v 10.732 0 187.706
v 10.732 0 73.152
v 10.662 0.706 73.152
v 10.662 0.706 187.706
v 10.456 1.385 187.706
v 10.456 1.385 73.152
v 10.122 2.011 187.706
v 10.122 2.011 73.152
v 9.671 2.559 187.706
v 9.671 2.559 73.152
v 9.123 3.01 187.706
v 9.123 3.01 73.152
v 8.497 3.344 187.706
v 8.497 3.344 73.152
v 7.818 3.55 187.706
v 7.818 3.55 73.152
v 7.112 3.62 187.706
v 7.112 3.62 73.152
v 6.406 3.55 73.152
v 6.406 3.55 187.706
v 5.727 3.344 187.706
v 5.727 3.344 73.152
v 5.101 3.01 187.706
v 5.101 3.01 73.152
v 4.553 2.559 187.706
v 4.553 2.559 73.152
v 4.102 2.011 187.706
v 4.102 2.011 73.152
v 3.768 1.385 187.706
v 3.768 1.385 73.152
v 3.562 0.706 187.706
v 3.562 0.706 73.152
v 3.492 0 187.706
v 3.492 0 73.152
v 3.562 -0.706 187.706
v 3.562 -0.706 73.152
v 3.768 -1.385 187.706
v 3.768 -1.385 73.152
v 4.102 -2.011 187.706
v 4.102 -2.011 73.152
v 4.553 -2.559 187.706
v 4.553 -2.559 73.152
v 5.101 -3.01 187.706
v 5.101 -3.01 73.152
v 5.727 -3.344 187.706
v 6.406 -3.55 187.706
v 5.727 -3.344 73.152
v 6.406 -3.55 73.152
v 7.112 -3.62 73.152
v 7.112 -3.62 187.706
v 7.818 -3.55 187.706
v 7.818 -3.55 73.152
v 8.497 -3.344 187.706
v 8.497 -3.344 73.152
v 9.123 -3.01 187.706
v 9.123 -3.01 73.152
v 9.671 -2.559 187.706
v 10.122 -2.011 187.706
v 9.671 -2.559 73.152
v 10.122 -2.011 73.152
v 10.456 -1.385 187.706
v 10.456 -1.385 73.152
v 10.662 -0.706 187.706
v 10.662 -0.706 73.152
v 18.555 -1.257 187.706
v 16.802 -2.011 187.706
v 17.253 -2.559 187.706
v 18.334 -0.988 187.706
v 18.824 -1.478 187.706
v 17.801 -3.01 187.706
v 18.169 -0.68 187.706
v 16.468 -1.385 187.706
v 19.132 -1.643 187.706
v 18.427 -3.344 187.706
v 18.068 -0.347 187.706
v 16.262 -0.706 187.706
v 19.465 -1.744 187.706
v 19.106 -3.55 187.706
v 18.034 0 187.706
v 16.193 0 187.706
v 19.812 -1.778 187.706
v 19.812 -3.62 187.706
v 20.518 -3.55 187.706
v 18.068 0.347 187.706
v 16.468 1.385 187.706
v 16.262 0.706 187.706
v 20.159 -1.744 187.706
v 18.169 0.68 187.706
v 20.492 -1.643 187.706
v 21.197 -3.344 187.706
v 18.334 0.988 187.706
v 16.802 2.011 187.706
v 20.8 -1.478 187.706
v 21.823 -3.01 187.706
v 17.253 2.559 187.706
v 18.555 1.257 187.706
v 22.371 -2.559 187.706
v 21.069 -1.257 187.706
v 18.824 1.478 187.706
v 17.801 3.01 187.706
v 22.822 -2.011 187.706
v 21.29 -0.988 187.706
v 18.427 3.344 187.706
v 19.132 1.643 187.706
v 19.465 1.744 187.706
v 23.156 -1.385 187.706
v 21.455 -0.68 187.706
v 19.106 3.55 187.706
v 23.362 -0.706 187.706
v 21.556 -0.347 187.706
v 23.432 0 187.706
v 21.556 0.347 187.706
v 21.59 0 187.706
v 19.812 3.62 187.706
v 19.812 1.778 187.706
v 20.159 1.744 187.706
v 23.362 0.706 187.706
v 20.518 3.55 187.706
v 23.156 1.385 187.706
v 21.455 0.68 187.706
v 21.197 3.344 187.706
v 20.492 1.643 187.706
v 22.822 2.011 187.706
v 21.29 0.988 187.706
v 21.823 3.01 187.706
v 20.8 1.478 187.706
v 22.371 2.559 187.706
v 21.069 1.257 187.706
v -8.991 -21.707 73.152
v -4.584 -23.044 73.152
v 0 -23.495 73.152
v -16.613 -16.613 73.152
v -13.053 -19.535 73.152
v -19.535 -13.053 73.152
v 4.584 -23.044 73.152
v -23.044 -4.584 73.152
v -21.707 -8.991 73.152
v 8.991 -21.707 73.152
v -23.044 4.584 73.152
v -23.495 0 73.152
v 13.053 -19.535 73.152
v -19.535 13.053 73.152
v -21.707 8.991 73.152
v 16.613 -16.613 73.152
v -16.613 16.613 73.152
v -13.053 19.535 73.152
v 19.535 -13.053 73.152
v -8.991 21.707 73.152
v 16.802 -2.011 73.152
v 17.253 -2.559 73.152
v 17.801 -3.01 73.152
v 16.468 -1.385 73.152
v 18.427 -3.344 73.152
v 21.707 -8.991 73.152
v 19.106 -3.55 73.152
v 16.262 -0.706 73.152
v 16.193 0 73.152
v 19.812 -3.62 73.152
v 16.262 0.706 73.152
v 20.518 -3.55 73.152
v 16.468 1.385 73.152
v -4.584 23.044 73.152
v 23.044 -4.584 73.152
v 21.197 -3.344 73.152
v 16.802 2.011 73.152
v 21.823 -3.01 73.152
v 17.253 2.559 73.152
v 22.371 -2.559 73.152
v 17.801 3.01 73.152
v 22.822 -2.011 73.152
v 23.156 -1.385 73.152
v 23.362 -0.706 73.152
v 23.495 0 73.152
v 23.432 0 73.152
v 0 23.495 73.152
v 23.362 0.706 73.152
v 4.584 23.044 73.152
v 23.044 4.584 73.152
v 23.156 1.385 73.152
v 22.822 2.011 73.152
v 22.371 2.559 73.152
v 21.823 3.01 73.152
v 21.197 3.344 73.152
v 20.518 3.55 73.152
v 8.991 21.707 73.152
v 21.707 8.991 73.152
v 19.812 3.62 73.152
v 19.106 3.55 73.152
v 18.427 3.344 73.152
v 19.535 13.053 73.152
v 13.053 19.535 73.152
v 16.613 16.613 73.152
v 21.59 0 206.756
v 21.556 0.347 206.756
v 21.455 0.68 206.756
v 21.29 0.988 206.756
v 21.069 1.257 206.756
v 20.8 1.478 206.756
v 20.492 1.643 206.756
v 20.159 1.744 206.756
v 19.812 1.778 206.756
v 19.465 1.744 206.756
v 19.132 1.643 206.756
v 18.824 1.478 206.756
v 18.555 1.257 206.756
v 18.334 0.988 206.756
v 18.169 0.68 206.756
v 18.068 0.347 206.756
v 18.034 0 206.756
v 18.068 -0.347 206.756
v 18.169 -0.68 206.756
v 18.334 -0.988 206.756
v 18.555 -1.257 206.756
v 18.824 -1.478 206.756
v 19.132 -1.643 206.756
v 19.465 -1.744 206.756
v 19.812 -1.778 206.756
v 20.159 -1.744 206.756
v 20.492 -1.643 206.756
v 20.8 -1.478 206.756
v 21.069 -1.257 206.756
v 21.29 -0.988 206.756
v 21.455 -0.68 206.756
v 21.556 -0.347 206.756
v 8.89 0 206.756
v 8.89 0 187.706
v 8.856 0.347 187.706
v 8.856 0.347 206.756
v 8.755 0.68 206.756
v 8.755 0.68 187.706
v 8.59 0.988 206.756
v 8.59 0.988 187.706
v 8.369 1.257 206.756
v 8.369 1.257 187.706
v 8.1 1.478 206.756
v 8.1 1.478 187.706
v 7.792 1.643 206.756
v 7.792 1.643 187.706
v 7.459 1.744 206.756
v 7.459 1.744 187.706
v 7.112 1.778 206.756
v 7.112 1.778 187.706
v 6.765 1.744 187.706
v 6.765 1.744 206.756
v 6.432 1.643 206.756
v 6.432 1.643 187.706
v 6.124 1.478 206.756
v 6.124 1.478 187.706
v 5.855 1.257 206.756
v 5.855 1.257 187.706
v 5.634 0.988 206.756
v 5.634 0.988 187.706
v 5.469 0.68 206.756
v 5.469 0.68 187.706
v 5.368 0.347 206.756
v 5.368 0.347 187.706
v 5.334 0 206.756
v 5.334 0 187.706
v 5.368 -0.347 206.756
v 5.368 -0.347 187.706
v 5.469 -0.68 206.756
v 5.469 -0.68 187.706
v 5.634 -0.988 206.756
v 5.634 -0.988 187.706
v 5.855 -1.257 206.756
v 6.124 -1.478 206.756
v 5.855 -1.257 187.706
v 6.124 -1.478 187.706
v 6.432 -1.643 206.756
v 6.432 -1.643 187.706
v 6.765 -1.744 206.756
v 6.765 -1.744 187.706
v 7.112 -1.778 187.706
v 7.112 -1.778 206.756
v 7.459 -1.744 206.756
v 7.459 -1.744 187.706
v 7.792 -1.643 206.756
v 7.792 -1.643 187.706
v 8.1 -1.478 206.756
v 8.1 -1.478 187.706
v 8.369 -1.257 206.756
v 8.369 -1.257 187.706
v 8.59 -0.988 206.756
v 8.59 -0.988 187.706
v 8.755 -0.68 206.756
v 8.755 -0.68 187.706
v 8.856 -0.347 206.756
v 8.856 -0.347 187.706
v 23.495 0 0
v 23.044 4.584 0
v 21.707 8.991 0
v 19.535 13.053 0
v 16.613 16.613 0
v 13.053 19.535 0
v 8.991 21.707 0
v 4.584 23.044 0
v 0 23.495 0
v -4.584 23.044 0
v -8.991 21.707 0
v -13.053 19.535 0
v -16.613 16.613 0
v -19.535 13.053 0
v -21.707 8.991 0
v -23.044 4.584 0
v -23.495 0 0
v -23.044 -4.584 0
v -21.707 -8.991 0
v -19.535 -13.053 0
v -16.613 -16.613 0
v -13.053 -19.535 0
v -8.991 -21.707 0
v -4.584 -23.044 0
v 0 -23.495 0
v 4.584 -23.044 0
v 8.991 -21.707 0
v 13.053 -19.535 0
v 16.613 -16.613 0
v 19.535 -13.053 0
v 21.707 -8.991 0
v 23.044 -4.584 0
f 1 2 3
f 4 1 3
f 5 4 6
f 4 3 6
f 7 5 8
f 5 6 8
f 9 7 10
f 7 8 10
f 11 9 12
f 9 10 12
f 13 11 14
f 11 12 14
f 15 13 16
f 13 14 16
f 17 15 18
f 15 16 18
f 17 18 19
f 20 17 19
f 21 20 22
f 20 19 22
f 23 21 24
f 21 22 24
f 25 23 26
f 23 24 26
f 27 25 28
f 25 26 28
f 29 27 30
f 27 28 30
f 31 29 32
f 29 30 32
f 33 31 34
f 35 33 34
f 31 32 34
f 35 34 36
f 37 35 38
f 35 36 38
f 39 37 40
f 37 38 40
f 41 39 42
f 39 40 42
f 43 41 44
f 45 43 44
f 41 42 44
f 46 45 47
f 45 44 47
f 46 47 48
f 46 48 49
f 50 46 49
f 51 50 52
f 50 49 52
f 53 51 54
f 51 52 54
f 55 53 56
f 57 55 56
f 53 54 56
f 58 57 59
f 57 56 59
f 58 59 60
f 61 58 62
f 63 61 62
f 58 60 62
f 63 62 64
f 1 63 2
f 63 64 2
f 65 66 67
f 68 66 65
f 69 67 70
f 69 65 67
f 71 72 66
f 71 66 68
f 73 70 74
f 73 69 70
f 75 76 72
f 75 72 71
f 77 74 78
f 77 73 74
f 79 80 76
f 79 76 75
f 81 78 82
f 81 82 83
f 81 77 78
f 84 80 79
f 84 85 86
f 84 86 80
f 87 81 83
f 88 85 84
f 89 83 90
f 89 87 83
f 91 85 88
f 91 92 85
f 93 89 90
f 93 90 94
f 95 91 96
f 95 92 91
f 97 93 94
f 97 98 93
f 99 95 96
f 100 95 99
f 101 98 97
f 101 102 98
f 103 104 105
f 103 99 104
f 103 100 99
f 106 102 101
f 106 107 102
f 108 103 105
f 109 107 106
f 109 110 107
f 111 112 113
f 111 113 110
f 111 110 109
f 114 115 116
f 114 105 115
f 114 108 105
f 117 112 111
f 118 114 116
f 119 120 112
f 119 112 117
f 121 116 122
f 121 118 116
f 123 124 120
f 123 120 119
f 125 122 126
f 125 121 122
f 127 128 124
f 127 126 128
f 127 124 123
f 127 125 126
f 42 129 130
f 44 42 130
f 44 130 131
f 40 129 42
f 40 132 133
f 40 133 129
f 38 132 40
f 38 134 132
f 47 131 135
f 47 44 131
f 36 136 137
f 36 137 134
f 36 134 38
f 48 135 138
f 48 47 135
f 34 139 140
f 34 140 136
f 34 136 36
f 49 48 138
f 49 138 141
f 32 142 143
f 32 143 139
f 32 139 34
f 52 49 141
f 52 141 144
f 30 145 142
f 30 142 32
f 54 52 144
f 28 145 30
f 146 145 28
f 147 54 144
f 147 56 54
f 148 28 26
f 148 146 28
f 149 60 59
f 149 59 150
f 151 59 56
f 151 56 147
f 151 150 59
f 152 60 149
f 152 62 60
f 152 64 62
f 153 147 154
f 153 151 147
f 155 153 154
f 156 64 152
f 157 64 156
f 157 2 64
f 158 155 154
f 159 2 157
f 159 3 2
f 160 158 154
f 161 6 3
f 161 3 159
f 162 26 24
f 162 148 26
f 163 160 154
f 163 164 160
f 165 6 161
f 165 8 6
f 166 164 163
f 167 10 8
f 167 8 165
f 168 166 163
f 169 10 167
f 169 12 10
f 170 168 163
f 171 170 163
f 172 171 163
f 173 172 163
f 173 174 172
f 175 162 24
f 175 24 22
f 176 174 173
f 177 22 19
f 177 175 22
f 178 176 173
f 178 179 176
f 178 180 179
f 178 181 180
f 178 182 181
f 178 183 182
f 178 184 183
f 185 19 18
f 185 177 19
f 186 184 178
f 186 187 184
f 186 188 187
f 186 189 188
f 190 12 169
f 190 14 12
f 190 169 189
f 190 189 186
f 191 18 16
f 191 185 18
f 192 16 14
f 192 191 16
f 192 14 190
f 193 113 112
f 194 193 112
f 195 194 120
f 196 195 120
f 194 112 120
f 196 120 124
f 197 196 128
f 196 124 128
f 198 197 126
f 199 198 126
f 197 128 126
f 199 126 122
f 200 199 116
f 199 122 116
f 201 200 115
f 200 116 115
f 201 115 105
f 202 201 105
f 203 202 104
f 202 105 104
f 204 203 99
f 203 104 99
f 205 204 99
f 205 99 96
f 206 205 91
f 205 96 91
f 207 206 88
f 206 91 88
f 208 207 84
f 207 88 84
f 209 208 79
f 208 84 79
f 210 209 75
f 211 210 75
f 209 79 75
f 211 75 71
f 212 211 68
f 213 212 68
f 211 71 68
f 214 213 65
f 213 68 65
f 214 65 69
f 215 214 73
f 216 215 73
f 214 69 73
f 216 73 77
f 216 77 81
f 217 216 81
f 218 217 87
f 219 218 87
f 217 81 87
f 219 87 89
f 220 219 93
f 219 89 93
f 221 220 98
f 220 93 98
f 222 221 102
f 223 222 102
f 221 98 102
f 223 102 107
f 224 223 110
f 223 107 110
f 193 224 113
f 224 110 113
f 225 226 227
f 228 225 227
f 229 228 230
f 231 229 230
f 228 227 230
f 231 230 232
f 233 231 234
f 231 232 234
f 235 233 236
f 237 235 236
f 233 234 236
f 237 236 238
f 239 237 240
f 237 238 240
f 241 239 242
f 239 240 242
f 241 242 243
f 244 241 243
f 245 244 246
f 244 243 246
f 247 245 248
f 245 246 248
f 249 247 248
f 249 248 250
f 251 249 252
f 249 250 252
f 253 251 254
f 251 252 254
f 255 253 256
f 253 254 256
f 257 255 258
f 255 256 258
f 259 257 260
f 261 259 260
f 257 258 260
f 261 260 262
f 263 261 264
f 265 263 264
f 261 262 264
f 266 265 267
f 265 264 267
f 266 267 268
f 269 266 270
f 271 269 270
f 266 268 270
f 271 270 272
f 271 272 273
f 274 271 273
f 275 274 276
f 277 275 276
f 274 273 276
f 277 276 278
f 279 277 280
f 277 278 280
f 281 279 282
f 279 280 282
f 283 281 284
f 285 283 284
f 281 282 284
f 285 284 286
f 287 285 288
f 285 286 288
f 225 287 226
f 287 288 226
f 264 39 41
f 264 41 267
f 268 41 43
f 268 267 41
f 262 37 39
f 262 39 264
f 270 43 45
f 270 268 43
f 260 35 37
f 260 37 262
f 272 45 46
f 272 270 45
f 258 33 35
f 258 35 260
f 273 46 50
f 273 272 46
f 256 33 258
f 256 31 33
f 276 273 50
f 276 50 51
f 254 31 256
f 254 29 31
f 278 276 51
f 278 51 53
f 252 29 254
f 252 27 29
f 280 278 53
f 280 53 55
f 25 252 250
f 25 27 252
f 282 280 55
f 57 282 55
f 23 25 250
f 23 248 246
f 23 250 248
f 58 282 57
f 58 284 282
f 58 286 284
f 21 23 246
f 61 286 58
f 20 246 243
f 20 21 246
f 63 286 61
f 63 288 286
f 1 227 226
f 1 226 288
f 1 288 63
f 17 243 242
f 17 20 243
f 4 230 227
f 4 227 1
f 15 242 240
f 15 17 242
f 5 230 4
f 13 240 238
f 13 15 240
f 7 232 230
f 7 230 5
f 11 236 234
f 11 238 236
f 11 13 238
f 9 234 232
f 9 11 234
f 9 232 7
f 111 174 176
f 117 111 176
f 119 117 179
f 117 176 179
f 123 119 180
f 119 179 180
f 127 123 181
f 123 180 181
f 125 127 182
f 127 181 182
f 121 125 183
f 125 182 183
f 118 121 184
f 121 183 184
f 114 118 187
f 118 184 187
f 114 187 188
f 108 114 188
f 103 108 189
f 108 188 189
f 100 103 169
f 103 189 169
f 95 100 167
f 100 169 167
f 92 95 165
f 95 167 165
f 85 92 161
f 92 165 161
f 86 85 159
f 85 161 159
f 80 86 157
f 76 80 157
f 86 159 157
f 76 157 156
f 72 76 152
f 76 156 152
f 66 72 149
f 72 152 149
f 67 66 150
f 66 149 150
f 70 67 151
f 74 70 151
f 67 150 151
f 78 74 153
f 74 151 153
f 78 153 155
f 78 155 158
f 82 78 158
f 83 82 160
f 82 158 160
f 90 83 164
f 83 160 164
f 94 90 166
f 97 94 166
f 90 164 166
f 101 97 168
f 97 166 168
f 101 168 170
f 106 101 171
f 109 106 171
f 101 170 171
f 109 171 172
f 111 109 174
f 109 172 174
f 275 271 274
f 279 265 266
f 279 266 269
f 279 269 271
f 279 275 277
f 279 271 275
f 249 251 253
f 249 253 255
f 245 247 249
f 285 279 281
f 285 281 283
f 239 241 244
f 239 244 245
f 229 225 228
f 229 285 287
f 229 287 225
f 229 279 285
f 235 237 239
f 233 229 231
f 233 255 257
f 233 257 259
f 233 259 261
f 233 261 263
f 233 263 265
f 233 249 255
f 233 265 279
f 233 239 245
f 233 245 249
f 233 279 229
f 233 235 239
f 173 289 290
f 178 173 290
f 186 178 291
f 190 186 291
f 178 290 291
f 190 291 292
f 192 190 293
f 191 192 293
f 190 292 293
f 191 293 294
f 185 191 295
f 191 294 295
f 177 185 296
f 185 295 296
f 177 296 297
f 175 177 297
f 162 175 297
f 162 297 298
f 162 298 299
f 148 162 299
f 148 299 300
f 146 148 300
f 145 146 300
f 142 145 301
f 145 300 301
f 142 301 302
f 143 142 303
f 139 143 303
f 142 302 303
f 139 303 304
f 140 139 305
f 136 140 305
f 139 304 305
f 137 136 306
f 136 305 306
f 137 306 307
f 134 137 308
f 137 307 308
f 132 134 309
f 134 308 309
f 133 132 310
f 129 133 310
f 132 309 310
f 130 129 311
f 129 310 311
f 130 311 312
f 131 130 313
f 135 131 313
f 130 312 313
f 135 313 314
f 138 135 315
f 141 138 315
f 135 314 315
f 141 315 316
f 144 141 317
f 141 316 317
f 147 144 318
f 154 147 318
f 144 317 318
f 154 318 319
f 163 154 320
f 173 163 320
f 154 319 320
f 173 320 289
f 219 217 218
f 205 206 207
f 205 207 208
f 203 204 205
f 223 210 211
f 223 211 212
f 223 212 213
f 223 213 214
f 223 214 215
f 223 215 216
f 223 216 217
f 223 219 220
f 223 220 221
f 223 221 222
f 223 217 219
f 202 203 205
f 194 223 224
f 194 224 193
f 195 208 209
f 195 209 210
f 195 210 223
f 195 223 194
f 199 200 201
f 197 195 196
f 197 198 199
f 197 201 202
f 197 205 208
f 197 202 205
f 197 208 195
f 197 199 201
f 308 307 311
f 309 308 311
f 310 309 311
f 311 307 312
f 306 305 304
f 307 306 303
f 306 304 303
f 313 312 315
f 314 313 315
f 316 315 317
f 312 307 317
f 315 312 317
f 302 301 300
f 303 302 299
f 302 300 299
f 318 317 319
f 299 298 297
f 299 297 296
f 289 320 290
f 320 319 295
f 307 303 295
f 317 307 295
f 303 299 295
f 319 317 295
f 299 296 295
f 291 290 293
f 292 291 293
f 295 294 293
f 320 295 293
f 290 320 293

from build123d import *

# Parameters (mm, degrees)
F0_R     = 23.495
F1_DEPTH = 73.152
F2_R     = 3.6195
F3_DEPTH = 114.554
F4_R     = 1.778
F5_DEPTH = 19.05


with BuildPart() as f1:
    # F0 (on Top) → F1 (new body)
    with BuildSketch(Plane.XY):
        Circle(F0_R)
    extrude(amount=F1_DEPTH)

    # F2 (on face) → F3 (join)
    with BuildSketch(Plane.XY.offset(73.152)):
        with Locations((19.812, 0)):
            Circle(F2_R)
        with Locations((7.112, 0)):
            Circle(F2_R)
    extrude(amount=F3_DEPTH)

    # F4 (on face) → F5 (join)
    with BuildSketch(Plane.XY.offset(187.706)):
        with Locations((7.112, 0)):
            Circle(F4_R)
        with Locations((19.812, 0)):
            Circle(F4_R)
    extrude(amount=F5_DEPTH)


solid = f1.part
